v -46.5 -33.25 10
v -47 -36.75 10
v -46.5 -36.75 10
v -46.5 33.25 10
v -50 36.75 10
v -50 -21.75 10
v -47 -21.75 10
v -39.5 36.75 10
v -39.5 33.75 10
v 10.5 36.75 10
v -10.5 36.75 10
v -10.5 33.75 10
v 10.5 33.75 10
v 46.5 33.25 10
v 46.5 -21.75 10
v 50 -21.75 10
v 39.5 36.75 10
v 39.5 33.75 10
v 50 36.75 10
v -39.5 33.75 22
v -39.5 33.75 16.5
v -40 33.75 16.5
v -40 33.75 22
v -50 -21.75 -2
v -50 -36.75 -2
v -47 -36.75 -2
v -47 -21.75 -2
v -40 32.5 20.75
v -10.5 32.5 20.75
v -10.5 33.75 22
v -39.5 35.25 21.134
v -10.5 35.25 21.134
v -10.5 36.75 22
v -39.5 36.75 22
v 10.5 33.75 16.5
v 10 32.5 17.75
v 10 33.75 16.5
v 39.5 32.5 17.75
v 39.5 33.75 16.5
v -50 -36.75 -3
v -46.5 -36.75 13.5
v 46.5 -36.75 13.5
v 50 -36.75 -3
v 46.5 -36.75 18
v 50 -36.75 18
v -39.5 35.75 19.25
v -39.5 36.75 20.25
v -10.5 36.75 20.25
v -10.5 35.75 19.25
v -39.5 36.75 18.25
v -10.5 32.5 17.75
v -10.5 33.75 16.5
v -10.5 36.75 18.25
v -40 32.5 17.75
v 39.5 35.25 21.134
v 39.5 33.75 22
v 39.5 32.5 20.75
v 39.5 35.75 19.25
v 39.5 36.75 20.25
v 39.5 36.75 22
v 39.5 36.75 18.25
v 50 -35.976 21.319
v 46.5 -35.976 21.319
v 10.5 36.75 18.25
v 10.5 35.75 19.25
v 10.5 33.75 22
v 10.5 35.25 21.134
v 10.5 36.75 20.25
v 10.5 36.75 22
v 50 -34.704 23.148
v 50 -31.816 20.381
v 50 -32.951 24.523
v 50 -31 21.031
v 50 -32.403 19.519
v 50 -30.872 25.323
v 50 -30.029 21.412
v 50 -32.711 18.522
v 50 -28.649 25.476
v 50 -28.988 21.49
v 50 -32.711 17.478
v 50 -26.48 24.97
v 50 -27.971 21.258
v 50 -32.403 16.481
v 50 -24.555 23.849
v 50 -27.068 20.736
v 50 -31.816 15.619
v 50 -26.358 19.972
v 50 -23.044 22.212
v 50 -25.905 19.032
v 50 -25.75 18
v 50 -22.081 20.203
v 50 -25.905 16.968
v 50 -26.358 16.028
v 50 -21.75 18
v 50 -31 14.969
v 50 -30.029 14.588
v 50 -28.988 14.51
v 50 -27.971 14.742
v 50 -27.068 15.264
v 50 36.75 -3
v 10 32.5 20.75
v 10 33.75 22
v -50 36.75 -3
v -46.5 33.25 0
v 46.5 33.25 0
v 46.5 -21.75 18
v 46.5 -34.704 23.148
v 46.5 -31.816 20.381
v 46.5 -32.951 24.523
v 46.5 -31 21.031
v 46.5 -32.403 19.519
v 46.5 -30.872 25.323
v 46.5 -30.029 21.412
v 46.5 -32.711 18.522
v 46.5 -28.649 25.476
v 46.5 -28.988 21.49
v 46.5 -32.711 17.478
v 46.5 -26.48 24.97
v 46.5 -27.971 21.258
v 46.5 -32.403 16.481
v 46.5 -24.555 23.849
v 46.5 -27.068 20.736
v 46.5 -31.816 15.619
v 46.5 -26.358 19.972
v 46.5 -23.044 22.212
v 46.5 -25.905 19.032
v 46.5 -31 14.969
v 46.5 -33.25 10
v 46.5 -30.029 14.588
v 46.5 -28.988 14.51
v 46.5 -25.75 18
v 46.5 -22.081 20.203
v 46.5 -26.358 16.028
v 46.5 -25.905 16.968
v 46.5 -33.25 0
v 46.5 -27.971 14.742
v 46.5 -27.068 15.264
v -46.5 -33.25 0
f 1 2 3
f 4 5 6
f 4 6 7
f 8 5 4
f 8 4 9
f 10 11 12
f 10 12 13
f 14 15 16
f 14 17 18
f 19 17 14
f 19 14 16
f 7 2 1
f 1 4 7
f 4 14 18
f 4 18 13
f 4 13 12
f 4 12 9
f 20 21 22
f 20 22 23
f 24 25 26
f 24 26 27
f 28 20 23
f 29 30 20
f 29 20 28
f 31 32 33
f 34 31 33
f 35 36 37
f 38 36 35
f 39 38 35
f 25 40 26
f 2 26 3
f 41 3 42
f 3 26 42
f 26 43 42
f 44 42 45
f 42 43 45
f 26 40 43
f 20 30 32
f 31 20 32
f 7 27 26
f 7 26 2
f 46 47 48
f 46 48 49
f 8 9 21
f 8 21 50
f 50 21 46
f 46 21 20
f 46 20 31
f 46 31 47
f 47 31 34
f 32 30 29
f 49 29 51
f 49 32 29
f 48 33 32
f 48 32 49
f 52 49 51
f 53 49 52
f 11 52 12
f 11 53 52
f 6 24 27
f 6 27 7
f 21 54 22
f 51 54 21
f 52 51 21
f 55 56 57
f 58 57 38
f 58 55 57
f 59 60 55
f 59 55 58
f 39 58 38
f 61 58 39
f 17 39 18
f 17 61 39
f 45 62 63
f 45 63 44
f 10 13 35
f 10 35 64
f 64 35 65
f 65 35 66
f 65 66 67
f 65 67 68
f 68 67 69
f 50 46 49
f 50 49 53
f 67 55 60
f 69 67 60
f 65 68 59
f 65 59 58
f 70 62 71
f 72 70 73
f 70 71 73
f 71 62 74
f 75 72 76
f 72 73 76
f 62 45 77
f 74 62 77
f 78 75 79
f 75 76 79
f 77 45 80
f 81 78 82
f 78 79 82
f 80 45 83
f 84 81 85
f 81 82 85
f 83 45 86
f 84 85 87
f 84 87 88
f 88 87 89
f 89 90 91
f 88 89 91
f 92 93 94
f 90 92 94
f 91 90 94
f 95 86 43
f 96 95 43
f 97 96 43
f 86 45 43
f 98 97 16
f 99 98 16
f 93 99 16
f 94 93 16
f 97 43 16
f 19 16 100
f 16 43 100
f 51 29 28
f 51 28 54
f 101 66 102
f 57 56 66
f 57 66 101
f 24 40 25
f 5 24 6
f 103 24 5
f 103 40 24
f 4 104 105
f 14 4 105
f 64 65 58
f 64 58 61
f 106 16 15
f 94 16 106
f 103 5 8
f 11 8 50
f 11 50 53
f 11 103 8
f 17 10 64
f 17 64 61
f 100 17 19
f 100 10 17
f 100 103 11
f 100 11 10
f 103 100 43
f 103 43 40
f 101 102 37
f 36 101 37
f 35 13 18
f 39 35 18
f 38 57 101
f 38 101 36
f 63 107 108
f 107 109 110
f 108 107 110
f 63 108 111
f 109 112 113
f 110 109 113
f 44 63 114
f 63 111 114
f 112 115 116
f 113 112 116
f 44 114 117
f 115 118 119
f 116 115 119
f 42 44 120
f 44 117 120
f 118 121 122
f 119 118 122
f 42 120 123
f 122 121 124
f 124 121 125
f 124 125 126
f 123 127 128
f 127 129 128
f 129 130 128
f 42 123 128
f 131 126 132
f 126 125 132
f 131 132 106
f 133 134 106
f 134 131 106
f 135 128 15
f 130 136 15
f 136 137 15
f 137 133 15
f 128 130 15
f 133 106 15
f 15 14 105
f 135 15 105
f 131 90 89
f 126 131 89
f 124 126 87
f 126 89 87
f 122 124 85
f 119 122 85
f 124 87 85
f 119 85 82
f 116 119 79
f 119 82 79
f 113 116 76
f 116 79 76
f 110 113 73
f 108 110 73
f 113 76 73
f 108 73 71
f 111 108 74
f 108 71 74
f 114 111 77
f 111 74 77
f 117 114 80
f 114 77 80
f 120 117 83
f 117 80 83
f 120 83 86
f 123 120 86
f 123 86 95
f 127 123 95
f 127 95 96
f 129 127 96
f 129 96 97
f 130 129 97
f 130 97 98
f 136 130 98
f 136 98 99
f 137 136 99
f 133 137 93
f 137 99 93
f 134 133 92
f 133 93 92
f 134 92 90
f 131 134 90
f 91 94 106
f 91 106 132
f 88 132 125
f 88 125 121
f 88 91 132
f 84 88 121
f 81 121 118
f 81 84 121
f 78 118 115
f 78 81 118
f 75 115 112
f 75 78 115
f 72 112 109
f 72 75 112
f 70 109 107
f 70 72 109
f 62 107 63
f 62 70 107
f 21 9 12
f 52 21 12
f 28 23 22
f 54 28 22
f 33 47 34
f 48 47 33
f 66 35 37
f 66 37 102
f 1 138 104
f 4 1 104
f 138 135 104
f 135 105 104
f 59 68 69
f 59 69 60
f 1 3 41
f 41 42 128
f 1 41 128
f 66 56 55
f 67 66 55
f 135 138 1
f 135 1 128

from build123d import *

# Parameters (mm, degrees)
SKETCH1_W            = 100
SKETCH1_H            = 73.5
SKETCH1_W_2          = 93
SKETCH1_H_2          = 66.5
BOSS_EXTRUDE1_DEPTH  = 10
SKETCH2_W            = 100
SKETCH2_H            = 73.5
BOSS_EXTRUDE2_DEPTH  = 3
SKETCH3_R            = 3.5
BOSS_EXTRUDE8_DEPTH  = 3.5
SKETCH4_W            = 12
SKETCH4_H            = 15
CUT_EXTRUDE4_DEPTH   = 3
SKETCH7_W            = 100
SKETCH7_H            = 3
BOSS_EXTRUDE12_DEPTH = 12
SKETCH8_W            = 21
SKETCH8_H            = 3
SKETCH8_W_2          = 10.5
CUT_EXTRUDE2_DEPTH   = 12
BOSS_EXTRUDE13_DEPTH = 29.5
BOSS_EXTRUDE14_DEPTH = 29.5
CUT_EXTRUDE3_DEPTH   = 93.5
BOSS_EXTRUDE15_DEPTH = 93


with BuildPart() as part:
    # Sketch1 → Boss-Extrude1 (new body)
    with BuildSketch(Plane.XY):
        Rectangle(SKETCH1_W, SKETCH1_H)
        Rectangle(SKETCH1_W_2, SKETCH1_H_2, mode=Mode.SUBTRACT)
    extrude(amount=BOSS_EXTRUDE1_DEPTH)

    # Sketch2 → Boss-Extrude2 (add)
    with BuildSketch(Plane(origin=(0, 0, 0), x_dir=(-1, 0, 0), z_dir=(0, 0, -1))):
        Rectangle(SKETCH2_W, SKETCH2_H)
    extrude(amount=BOSS_EXTRUDE2_DEPTH)

    # Sketch3 → Boss-Extrude8 (add)
    with BuildSketch(Plane(origin=(50, 0, 0), x_dir=(0, 0, -1), z_dir=(1, 0, 0))):
        with BuildLine():
            Line((-10, -21.75), (-18, -21.75))
            ThreePointArc((-18, -21.75), (-25.303809073, -27.545777883), (-21.319283456, -35.975500527))
            Line((-21.319283456, -35.975500527), (-18, -36.75))
            Line((-18, -36.75), (-10, -36.75))
            Line((-10, -36.75), (-10, -21.75))
        make_face()
        with Locations(Location((-18, -29.25, 0), (0, 0, 90))):
            Circle(SKETCH3_R, mode=Mode.SUBTRACT)
    extrude(amount=-BOSS_EXTRUDE8_DEPTH)

    # Sketch4 → Cut-Extrude4 (cut)
    with BuildSketch(Plane.ZY.offset(50)):
        with Locations((4, -29.25)):
            Rectangle(SKETCH4_W, SKETCH4_H)
    extrude(amount=-CUT_EXTRUDE4_DEPTH, mode=Mode.SUBTRACT)

    # Sketch7 → Boss-Extrude12 (add)
    with BuildSketch(Plane.XY.offset(10)):
        with Locations((0, 35.25)):
            Rectangle(SKETCH7_W, SKETCH7_H)
    extrude(amount=BOSS_EXTRUDE12_DEPTH)

    # Sketch8 → Cut-Extrude2 (cut)
    with BuildSketch(Plane.XY.offset(22)):
        with Locations((0, 35.25)):
            Rectangle(SKETCH8_W, SKETCH8_H)
        with Locations((-44.75, 35.25)):
            Rectangle(SKETCH8_W_2, SKETCH8_H)
        with Locations((44.75, 35.25)):
            Rectangle(SKETCH8_W_2, SKETCH8_H)
    extrude(amount=-CUT_EXTRUDE2_DEPTH, mode=Mode.SUBTRACT)

    # Sketch9 → Boss-Extrude13 (add)
    with BuildSketch(Plane(origin=(39.5, 0, 0), x_dir=(0, 0, -1), z_dir=(1, 0, 0))):
        Polygon((-22, 33.75), (-20.75, 32.5), (-17.75, 32.5), (-16.5, 33.75), align=None)
    extrude(amount=-BOSS_EXTRUDE13_DEPTH)

    # Sketch10 → Boss-Extrude14 (add)
    with BuildSketch(Plane(origin=(-10.5, 0, 0), x_dir=(0, 0, -1), z_dir=(1, 0, 0))):
        Polygon((-22, 33.75), (-20.75, 32.5), (-17.75, 32.5), (-16.5, 33.75), align=None)
    extrude(amount=-BOSS_EXTRUDE14_DEPTH)

    # Sketch11 → Cut-Extrude3 (cut)
    with BuildSketch(Plane(origin=(39.5, 0, 0), x_dir=(0, 0, -1), z_dir=(1, 0, 0))):
        Polygon((-19.25, 36.75), (-19.25, 35.75), (-18.25, 36.75), align=None)
        Polygon((-19.25, 36.75), (-20.25, 36.75), (-19.25, 35.75), align=None)
        Polygon((-21.133974596, 35.25), (-22, 36.75), (-22, 35.25), align=None)
        Polygon((-22, 33.75), (-21.133974596, 35.25), (-22, 35.25), align=None)
    extrude(amount=-CUT_EXTRUDE3_DEPTH, mode=Mode.SUBTRACT)

    # Sketch12 → Boss-Extrude15 (add)
    with BuildSketch(Plane.ZY.offset(-46.5)):
        Polygon((10, -36.75), (13.5, -36.75), (10, -33.25), align=None)
    extrude(amount=BOSS_EXTRUDE15_DEPTH)


solid = part.part
